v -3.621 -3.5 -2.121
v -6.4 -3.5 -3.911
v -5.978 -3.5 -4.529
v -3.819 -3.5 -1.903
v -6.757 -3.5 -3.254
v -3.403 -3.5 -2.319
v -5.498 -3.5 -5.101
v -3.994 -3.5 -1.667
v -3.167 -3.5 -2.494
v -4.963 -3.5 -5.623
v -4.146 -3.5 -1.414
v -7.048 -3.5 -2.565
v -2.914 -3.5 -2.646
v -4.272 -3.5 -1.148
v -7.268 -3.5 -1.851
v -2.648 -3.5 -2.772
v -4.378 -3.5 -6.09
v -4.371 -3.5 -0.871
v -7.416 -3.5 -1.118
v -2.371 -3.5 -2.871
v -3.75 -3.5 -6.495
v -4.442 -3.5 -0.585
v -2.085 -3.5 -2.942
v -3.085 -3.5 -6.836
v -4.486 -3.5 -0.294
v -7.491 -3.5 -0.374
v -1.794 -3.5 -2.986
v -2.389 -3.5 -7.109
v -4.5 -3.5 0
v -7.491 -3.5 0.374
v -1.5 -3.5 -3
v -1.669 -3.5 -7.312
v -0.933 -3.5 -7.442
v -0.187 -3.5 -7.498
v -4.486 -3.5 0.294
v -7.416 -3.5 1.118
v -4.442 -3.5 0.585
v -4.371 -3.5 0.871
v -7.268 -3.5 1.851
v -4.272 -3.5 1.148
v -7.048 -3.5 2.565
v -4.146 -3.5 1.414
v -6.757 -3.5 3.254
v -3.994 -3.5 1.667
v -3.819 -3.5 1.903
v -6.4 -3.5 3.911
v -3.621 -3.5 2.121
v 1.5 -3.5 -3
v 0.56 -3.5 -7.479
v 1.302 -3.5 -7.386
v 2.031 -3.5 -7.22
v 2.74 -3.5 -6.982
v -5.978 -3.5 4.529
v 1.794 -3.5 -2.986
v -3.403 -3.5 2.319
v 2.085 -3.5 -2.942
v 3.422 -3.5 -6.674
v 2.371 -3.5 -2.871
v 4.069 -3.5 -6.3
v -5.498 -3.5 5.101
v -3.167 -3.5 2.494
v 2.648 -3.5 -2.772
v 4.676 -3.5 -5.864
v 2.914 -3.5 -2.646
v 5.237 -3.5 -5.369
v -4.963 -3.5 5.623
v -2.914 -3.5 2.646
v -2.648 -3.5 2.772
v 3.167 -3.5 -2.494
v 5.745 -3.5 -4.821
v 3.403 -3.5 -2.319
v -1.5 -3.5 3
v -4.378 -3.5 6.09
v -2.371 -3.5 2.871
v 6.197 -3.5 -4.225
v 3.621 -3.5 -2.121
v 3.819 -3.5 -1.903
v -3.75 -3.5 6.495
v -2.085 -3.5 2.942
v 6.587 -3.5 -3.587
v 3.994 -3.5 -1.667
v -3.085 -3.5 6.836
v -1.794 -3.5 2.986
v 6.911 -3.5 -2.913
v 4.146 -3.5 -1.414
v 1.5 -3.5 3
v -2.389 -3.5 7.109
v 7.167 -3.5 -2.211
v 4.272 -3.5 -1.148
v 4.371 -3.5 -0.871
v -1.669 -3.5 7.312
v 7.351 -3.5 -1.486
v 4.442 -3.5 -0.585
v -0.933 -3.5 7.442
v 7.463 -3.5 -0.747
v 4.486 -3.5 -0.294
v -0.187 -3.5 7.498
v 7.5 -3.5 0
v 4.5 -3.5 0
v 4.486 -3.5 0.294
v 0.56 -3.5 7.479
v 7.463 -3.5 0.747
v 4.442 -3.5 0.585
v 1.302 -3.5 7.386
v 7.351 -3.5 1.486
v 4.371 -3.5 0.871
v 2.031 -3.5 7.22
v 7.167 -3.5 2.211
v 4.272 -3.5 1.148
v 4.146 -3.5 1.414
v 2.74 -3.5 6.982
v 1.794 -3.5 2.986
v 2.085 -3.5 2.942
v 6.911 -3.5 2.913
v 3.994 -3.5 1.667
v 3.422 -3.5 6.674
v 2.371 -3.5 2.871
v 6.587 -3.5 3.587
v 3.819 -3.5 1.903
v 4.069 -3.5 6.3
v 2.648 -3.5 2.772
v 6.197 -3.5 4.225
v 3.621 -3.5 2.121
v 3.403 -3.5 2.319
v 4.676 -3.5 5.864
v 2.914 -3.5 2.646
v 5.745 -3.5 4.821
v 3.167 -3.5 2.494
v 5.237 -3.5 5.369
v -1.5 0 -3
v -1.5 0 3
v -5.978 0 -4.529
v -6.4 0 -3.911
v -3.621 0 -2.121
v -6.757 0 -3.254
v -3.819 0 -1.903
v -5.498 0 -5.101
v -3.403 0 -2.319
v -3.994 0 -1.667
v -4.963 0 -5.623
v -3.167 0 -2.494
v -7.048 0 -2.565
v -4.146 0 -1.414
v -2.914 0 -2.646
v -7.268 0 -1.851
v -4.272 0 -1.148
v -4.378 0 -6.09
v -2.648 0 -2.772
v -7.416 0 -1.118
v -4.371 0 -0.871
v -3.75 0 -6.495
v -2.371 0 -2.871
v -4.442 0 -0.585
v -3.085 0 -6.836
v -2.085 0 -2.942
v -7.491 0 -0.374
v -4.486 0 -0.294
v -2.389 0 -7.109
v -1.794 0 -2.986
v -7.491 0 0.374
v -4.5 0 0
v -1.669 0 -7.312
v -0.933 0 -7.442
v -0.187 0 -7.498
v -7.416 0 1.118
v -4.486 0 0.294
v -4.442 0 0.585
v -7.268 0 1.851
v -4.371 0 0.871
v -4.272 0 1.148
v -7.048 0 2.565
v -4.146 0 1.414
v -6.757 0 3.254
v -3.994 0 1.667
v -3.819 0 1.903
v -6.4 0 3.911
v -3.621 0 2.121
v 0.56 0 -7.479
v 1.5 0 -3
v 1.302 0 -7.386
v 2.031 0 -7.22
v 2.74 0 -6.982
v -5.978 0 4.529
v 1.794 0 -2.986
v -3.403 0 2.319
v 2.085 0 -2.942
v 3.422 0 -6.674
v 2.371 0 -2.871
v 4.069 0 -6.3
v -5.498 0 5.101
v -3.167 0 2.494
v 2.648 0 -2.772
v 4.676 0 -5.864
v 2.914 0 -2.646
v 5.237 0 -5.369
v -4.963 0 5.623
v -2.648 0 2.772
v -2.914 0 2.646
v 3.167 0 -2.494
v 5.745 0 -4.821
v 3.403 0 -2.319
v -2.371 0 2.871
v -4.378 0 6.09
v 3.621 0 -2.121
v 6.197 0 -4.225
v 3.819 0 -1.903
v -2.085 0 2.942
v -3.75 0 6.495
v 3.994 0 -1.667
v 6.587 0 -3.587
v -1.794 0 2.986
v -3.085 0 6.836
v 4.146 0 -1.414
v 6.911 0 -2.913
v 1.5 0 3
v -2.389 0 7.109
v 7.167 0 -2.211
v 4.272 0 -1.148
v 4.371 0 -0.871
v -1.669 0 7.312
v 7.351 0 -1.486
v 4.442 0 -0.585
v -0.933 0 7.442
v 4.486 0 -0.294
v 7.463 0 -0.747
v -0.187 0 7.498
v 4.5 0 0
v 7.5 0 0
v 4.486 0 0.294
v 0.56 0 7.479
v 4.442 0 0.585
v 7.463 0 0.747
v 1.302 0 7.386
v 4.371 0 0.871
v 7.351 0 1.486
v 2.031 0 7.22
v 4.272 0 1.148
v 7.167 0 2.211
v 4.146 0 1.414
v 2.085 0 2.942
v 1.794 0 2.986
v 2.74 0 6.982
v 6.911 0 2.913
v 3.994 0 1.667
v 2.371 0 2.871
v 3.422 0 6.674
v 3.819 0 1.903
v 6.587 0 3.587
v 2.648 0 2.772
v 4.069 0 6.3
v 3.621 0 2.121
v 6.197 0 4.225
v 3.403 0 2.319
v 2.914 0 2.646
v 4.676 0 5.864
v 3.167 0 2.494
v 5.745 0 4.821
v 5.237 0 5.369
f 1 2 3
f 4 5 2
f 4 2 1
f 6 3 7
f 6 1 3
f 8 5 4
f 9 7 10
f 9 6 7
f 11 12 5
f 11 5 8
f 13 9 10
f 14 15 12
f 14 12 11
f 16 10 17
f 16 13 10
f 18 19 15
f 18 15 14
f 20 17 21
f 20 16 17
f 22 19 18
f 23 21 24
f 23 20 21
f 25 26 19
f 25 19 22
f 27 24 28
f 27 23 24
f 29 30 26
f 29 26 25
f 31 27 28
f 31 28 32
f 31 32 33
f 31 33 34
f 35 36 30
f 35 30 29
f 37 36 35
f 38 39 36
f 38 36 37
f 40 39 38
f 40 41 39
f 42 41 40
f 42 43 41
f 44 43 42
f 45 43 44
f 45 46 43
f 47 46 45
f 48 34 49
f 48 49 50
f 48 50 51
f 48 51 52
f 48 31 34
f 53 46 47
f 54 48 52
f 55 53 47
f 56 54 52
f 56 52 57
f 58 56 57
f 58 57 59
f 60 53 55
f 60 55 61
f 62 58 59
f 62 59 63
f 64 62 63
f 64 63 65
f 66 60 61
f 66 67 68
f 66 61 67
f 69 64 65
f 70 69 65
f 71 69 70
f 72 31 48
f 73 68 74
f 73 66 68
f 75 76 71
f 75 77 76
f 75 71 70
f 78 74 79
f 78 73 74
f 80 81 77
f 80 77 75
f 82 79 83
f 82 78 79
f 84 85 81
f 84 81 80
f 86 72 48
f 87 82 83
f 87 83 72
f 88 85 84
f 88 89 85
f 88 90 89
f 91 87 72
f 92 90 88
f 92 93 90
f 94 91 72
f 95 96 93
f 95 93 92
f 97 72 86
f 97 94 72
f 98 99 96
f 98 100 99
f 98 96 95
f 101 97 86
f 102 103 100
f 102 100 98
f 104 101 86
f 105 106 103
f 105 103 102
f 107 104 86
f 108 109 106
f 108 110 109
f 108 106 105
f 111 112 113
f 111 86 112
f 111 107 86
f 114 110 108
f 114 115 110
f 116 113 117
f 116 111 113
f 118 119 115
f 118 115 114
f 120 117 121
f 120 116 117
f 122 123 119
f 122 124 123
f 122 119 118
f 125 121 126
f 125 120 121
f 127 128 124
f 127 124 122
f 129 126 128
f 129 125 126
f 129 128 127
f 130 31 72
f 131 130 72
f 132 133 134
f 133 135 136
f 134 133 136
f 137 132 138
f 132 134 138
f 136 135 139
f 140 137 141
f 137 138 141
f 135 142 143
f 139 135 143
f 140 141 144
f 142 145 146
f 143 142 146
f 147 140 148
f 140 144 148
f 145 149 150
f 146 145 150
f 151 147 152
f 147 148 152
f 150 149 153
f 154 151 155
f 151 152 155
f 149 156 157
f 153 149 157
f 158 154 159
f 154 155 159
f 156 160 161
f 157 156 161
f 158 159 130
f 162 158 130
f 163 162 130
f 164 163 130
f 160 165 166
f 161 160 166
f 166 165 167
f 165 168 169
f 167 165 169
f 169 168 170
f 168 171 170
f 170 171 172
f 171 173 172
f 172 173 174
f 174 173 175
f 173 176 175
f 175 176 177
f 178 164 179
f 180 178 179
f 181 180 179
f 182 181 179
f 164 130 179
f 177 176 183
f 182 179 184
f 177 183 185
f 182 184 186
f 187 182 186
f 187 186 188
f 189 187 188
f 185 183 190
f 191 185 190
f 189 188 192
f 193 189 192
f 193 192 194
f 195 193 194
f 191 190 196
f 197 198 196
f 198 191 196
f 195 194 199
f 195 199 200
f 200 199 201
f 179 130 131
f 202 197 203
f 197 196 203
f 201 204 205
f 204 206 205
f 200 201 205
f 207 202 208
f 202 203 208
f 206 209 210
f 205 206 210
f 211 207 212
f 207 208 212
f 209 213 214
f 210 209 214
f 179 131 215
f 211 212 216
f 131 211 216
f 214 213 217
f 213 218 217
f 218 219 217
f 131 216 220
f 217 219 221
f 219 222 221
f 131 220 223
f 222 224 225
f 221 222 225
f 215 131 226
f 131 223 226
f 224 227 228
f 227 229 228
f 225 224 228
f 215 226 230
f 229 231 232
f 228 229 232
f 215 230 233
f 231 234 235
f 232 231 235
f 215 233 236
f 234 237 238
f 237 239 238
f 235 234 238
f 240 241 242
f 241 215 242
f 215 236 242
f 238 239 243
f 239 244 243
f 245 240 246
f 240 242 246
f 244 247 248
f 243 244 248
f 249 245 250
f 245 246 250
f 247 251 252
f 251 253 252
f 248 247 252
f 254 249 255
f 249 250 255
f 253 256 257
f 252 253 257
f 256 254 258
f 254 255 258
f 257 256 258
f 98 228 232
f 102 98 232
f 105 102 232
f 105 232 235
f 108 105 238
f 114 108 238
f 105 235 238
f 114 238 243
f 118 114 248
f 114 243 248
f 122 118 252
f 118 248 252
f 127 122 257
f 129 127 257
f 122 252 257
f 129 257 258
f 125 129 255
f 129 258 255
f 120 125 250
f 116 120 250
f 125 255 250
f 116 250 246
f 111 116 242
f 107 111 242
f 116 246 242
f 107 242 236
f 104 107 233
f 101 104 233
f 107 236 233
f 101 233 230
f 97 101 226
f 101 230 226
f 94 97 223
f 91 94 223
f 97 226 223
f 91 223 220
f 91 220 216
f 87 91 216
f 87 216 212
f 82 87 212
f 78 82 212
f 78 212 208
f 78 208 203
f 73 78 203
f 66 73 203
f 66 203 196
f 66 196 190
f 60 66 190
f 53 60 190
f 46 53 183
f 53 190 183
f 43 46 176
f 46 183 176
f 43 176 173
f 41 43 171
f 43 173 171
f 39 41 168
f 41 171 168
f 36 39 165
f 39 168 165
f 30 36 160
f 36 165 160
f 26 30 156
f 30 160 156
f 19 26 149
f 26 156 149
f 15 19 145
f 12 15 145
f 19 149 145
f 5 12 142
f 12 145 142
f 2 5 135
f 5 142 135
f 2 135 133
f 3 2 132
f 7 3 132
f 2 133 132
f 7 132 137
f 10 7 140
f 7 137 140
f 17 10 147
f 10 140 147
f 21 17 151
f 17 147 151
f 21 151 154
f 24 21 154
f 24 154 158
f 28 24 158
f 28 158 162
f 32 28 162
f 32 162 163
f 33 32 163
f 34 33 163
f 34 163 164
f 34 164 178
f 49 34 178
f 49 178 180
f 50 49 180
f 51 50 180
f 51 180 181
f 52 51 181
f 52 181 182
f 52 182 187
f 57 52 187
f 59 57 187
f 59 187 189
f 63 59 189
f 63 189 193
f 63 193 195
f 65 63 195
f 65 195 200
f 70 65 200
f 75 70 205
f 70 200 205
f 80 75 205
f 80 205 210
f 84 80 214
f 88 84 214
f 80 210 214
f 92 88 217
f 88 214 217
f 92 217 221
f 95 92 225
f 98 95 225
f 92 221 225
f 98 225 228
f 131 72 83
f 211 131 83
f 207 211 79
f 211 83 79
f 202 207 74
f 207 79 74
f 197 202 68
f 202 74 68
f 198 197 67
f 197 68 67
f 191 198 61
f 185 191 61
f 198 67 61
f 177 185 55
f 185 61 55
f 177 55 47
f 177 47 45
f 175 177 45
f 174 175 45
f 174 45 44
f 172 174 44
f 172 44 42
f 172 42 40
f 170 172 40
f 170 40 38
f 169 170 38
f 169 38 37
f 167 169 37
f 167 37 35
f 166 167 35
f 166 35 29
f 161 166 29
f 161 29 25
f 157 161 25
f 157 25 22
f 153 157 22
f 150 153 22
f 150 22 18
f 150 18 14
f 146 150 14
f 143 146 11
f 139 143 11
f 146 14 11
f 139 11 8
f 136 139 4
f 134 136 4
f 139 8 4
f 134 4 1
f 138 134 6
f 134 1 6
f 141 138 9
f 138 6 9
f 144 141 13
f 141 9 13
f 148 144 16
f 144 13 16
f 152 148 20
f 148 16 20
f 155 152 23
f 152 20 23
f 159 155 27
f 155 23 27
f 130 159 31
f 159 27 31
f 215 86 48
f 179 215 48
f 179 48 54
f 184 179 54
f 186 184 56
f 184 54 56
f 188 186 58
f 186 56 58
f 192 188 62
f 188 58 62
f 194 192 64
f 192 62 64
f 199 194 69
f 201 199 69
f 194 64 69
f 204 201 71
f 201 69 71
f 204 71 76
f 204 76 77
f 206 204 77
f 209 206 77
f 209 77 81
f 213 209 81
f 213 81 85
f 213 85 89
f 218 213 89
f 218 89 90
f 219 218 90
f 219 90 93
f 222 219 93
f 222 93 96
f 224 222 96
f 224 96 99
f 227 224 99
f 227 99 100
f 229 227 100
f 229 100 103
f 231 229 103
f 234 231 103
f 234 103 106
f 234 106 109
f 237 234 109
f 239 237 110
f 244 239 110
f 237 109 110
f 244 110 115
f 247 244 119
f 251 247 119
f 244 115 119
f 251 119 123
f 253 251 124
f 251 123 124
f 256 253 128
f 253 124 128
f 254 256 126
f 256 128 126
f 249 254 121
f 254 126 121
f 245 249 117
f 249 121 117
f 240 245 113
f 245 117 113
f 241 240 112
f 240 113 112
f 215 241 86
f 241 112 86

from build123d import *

# Parameters (mm, degrees)
F0_R     = 7.5
F1_DEPTH = 3.5
F3_DEPTH = 25


with BuildPart() as f1:
    # F0 (on Front) → F1 (new body)
    with BuildSketch(Plane.XZ):
        Circle(F0_R)
    extrude(amount=F1_DEPTH)

    # F2 (on face) → F3 (cut)
    with BuildSketch(Plane.XZ.offset(3.5)):
        with BuildLine():
            ThreePointArc((1.5, -3), (4.5, 0), (1.5, 3))
            Line((1.5, 3), (1.5, -3))
        make_face()
        with BuildLine():
            Line((-1.5, -3), (-1.5, 3))
            ThreePointArc((-1.5, 3), (-4.5, 0), (-1.5, -3))
        make_face()
    extrude(amount=-F3_DEPTH, mode=Mode.SUBTRACT)


solid = f1.part
